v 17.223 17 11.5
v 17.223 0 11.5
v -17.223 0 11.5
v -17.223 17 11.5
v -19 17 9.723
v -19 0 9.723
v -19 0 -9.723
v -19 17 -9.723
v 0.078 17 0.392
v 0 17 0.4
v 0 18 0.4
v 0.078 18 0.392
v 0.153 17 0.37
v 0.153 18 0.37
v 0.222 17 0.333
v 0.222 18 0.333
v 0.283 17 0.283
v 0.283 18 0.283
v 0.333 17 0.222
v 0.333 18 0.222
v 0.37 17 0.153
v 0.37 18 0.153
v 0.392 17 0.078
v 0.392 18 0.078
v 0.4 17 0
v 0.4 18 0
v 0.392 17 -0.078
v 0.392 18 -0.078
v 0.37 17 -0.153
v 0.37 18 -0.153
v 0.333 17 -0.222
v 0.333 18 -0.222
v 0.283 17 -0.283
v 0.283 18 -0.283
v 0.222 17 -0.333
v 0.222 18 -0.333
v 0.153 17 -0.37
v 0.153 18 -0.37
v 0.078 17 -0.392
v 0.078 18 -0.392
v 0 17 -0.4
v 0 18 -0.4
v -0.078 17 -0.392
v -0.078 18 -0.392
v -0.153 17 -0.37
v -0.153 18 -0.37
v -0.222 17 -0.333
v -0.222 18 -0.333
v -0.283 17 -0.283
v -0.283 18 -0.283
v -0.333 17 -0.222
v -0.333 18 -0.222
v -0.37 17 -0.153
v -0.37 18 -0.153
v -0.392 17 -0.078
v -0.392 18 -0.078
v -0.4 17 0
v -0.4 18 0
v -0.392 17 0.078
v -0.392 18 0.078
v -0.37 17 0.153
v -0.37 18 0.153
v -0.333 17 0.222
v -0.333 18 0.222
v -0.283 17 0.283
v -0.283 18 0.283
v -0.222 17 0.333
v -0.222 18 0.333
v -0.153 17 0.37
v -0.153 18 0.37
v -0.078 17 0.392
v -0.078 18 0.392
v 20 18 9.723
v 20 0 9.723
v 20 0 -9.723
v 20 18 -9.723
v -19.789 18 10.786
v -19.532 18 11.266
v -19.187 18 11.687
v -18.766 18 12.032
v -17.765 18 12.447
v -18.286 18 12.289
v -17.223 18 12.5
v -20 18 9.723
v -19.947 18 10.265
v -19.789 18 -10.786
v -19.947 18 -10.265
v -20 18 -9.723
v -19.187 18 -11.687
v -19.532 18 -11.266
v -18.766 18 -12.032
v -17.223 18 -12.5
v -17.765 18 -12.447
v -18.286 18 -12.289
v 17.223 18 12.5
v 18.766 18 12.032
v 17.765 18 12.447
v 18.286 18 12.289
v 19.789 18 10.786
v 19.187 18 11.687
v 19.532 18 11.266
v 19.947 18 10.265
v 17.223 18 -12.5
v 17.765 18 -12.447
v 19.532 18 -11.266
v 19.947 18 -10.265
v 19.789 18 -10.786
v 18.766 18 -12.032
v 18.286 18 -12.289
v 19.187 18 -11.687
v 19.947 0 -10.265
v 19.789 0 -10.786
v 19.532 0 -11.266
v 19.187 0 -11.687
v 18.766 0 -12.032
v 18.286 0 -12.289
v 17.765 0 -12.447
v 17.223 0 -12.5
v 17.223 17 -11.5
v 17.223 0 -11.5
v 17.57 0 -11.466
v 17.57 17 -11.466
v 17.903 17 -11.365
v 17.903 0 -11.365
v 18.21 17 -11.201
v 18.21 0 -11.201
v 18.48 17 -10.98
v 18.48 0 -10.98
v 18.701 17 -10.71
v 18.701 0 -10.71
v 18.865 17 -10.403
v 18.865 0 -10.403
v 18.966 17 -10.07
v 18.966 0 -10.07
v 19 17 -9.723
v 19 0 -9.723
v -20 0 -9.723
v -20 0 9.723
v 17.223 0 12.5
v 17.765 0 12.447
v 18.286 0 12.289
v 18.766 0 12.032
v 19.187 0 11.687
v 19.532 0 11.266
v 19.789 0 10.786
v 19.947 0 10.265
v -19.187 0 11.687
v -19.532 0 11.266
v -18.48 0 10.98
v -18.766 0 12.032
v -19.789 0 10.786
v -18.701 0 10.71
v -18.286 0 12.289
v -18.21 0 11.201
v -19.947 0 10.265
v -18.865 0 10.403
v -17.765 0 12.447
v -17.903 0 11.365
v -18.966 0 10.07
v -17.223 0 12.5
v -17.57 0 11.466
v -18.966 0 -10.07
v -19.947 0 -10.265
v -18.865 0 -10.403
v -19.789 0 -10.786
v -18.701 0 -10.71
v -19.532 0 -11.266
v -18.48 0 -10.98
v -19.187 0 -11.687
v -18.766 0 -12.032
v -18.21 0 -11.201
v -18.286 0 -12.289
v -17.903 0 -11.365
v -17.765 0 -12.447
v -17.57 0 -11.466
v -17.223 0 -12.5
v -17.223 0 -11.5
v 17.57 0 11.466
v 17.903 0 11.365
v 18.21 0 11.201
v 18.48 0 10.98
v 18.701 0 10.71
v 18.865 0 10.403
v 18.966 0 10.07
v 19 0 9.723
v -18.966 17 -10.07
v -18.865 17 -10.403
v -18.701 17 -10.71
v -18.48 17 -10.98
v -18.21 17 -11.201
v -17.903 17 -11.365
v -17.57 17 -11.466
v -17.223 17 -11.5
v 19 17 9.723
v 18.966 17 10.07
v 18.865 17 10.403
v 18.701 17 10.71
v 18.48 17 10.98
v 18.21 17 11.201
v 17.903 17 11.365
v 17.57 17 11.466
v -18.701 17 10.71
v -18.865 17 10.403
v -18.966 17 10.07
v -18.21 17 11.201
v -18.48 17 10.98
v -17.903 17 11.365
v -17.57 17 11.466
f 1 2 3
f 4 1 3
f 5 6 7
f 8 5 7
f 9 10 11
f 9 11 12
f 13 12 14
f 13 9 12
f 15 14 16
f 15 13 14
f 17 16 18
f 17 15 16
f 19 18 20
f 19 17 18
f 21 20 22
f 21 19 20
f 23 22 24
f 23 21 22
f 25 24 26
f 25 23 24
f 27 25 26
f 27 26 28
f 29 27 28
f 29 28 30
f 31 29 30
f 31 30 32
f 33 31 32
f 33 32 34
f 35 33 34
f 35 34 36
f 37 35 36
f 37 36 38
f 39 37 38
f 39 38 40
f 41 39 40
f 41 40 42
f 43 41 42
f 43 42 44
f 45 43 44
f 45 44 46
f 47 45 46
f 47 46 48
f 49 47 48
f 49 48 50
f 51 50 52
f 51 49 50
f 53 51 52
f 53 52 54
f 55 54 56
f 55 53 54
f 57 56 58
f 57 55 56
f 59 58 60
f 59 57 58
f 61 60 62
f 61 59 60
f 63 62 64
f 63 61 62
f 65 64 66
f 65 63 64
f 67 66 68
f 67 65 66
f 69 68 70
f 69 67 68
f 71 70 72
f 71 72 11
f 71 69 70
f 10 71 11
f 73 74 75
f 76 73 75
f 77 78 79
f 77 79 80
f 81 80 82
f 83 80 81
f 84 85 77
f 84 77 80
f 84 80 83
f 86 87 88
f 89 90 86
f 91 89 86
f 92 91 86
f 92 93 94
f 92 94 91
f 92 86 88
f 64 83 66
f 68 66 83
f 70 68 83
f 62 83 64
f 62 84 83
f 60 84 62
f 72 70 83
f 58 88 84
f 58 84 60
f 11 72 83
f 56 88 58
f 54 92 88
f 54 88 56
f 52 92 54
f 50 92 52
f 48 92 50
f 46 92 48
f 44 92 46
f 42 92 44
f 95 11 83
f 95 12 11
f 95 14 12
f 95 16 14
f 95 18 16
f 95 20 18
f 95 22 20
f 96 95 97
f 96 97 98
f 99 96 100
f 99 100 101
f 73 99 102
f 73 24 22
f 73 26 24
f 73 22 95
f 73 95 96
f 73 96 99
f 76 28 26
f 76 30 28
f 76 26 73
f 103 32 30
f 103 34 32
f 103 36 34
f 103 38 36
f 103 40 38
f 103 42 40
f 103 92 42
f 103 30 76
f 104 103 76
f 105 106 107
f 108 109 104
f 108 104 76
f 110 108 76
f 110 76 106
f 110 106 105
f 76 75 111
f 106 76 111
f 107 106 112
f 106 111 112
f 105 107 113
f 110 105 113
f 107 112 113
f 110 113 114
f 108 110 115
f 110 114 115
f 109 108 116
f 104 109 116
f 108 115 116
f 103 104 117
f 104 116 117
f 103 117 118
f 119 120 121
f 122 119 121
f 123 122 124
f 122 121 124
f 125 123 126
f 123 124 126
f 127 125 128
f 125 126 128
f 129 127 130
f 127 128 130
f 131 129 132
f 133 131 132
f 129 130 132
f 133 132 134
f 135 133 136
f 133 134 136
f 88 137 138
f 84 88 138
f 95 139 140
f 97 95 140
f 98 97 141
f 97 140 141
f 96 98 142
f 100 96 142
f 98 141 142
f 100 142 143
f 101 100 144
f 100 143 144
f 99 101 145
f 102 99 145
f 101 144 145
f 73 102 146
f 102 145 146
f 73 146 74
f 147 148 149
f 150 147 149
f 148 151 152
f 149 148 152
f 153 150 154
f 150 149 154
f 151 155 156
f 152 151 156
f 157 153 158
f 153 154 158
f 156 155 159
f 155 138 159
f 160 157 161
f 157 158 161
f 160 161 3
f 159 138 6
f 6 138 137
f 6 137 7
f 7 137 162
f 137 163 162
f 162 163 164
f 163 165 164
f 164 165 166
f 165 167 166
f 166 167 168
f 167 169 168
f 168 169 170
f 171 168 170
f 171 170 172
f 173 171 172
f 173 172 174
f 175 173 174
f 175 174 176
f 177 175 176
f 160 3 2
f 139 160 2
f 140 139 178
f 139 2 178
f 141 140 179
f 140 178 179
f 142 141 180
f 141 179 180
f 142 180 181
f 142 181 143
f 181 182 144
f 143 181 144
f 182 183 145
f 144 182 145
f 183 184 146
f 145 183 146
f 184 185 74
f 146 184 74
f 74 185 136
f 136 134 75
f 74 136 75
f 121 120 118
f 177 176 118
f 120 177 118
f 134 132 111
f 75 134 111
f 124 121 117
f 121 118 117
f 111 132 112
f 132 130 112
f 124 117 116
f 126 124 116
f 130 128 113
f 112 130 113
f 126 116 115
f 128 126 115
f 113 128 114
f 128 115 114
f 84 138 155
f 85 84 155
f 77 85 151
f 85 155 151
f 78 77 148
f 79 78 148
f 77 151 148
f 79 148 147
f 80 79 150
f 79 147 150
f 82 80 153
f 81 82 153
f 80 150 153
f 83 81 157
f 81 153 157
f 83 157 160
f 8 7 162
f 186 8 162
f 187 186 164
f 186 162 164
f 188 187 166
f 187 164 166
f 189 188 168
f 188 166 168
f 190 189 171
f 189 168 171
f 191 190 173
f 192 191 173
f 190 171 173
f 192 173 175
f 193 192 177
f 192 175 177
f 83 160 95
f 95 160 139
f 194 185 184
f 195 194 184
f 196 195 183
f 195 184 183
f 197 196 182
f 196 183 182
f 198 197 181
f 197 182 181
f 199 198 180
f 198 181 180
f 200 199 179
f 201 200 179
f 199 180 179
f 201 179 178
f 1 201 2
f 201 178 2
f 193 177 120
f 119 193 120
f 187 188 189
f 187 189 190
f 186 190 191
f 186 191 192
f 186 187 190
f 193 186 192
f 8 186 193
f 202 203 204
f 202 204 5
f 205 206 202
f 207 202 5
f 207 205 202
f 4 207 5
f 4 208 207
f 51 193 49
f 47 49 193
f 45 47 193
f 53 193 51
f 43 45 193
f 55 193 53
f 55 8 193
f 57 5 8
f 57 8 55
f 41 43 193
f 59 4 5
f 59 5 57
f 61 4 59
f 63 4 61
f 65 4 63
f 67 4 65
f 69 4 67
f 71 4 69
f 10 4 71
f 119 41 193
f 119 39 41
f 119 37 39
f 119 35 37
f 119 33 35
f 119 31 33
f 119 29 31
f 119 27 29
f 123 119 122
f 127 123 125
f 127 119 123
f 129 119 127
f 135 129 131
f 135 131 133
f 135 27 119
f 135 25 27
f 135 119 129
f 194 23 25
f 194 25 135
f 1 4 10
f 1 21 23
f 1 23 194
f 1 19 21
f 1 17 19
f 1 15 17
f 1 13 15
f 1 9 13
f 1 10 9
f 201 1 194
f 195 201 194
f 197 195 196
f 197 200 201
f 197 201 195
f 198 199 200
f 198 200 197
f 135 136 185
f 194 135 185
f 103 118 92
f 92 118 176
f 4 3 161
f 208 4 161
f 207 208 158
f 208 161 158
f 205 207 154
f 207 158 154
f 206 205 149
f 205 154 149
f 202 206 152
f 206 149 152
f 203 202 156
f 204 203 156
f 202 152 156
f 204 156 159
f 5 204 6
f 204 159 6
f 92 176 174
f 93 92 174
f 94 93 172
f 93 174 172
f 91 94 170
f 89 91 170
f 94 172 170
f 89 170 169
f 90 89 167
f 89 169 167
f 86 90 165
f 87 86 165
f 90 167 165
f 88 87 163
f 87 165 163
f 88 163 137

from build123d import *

# Parameters (mm, degrees)
SKETCH2_R           = 0.4
BOSS_EXTRUDE1_DEPTH = 18
CUT_EXTRUDE1_DEPTH  = 17


with BuildPart() as part:
    # Sketch2 → Boss-Extrude1 (new body)
    with BuildSketch(Plane(origin=(0, 0, 0), x_dir=(1, 0, 0), z_dir=(0, 1, 0))):
        with BuildLine():
            Line((-20, 9.723165676), (-20, -9.723165676))
            ThreePointArc((-20, -9.723165676), (-19.186684057, -11.686684057), (-17.223165676, -12.5))
            Line((-17.223165676, -12.5), (17.223165676, -12.5))
            ThreePointArc((17.223165676, -12.5), (19.186684057, -11.686684057), (20, -9.723165676))
            Line((20, -9.723165676), (20, 9.723165676))
            ThreePointArc((20, 9.723165676), (19.186684057, 11.686684057), (17.223165676, 12.5))
            Line((17.223165676, 12.5), (-17.223165676, 12.5))
            ThreePointArc((-17.223165676, 12.5), (-19.186684057, 11.686684057), (-20, 9.723165676))
        make_face()
        with Locations(Location((0, 0, 0), (0, 0, 270))):
            Circle(SKETCH2_R, mode=Mode.SUBTRACT)
    extrude(amount=BOSS_EXTRUDE1_DEPTH)

    # Sketch3 → Cut-Extrude1 (cut)
    with BuildSketch(Plane.XZ):
        with BuildLine():
            Line((19, -9.723165676), (19, 9.723165676))
            ThreePointArc((19, 9.723165676), (18.479577276, 10.979577276), (17.223165676, 11.5))
            Line((17.223165676, 11.5), (-17.223165676, 11.5))
            ThreePointArc((-17.223165676, 11.5), (-18.479577276, 10.979577276), (-19, 9.723165676))
            Line((-19, 9.723165676), (-19, -9.723165676))
            ThreePointArc((-19, -9.723165676), (-18.479577276, -10.979577276), (-17.223165676, -11.5))
            Line((-17.223165676, -11.5), (17.223165676, -11.5))
            ThreePointArc((17.223165676, -11.5), (18.479577276, -10.979577276), (19, -9.723165676))
        make_face()
    extrude(amount=-CUT_EXTRUDE1_DEPTH, mode=Mode.SUBTRACT)


solid = part.part
